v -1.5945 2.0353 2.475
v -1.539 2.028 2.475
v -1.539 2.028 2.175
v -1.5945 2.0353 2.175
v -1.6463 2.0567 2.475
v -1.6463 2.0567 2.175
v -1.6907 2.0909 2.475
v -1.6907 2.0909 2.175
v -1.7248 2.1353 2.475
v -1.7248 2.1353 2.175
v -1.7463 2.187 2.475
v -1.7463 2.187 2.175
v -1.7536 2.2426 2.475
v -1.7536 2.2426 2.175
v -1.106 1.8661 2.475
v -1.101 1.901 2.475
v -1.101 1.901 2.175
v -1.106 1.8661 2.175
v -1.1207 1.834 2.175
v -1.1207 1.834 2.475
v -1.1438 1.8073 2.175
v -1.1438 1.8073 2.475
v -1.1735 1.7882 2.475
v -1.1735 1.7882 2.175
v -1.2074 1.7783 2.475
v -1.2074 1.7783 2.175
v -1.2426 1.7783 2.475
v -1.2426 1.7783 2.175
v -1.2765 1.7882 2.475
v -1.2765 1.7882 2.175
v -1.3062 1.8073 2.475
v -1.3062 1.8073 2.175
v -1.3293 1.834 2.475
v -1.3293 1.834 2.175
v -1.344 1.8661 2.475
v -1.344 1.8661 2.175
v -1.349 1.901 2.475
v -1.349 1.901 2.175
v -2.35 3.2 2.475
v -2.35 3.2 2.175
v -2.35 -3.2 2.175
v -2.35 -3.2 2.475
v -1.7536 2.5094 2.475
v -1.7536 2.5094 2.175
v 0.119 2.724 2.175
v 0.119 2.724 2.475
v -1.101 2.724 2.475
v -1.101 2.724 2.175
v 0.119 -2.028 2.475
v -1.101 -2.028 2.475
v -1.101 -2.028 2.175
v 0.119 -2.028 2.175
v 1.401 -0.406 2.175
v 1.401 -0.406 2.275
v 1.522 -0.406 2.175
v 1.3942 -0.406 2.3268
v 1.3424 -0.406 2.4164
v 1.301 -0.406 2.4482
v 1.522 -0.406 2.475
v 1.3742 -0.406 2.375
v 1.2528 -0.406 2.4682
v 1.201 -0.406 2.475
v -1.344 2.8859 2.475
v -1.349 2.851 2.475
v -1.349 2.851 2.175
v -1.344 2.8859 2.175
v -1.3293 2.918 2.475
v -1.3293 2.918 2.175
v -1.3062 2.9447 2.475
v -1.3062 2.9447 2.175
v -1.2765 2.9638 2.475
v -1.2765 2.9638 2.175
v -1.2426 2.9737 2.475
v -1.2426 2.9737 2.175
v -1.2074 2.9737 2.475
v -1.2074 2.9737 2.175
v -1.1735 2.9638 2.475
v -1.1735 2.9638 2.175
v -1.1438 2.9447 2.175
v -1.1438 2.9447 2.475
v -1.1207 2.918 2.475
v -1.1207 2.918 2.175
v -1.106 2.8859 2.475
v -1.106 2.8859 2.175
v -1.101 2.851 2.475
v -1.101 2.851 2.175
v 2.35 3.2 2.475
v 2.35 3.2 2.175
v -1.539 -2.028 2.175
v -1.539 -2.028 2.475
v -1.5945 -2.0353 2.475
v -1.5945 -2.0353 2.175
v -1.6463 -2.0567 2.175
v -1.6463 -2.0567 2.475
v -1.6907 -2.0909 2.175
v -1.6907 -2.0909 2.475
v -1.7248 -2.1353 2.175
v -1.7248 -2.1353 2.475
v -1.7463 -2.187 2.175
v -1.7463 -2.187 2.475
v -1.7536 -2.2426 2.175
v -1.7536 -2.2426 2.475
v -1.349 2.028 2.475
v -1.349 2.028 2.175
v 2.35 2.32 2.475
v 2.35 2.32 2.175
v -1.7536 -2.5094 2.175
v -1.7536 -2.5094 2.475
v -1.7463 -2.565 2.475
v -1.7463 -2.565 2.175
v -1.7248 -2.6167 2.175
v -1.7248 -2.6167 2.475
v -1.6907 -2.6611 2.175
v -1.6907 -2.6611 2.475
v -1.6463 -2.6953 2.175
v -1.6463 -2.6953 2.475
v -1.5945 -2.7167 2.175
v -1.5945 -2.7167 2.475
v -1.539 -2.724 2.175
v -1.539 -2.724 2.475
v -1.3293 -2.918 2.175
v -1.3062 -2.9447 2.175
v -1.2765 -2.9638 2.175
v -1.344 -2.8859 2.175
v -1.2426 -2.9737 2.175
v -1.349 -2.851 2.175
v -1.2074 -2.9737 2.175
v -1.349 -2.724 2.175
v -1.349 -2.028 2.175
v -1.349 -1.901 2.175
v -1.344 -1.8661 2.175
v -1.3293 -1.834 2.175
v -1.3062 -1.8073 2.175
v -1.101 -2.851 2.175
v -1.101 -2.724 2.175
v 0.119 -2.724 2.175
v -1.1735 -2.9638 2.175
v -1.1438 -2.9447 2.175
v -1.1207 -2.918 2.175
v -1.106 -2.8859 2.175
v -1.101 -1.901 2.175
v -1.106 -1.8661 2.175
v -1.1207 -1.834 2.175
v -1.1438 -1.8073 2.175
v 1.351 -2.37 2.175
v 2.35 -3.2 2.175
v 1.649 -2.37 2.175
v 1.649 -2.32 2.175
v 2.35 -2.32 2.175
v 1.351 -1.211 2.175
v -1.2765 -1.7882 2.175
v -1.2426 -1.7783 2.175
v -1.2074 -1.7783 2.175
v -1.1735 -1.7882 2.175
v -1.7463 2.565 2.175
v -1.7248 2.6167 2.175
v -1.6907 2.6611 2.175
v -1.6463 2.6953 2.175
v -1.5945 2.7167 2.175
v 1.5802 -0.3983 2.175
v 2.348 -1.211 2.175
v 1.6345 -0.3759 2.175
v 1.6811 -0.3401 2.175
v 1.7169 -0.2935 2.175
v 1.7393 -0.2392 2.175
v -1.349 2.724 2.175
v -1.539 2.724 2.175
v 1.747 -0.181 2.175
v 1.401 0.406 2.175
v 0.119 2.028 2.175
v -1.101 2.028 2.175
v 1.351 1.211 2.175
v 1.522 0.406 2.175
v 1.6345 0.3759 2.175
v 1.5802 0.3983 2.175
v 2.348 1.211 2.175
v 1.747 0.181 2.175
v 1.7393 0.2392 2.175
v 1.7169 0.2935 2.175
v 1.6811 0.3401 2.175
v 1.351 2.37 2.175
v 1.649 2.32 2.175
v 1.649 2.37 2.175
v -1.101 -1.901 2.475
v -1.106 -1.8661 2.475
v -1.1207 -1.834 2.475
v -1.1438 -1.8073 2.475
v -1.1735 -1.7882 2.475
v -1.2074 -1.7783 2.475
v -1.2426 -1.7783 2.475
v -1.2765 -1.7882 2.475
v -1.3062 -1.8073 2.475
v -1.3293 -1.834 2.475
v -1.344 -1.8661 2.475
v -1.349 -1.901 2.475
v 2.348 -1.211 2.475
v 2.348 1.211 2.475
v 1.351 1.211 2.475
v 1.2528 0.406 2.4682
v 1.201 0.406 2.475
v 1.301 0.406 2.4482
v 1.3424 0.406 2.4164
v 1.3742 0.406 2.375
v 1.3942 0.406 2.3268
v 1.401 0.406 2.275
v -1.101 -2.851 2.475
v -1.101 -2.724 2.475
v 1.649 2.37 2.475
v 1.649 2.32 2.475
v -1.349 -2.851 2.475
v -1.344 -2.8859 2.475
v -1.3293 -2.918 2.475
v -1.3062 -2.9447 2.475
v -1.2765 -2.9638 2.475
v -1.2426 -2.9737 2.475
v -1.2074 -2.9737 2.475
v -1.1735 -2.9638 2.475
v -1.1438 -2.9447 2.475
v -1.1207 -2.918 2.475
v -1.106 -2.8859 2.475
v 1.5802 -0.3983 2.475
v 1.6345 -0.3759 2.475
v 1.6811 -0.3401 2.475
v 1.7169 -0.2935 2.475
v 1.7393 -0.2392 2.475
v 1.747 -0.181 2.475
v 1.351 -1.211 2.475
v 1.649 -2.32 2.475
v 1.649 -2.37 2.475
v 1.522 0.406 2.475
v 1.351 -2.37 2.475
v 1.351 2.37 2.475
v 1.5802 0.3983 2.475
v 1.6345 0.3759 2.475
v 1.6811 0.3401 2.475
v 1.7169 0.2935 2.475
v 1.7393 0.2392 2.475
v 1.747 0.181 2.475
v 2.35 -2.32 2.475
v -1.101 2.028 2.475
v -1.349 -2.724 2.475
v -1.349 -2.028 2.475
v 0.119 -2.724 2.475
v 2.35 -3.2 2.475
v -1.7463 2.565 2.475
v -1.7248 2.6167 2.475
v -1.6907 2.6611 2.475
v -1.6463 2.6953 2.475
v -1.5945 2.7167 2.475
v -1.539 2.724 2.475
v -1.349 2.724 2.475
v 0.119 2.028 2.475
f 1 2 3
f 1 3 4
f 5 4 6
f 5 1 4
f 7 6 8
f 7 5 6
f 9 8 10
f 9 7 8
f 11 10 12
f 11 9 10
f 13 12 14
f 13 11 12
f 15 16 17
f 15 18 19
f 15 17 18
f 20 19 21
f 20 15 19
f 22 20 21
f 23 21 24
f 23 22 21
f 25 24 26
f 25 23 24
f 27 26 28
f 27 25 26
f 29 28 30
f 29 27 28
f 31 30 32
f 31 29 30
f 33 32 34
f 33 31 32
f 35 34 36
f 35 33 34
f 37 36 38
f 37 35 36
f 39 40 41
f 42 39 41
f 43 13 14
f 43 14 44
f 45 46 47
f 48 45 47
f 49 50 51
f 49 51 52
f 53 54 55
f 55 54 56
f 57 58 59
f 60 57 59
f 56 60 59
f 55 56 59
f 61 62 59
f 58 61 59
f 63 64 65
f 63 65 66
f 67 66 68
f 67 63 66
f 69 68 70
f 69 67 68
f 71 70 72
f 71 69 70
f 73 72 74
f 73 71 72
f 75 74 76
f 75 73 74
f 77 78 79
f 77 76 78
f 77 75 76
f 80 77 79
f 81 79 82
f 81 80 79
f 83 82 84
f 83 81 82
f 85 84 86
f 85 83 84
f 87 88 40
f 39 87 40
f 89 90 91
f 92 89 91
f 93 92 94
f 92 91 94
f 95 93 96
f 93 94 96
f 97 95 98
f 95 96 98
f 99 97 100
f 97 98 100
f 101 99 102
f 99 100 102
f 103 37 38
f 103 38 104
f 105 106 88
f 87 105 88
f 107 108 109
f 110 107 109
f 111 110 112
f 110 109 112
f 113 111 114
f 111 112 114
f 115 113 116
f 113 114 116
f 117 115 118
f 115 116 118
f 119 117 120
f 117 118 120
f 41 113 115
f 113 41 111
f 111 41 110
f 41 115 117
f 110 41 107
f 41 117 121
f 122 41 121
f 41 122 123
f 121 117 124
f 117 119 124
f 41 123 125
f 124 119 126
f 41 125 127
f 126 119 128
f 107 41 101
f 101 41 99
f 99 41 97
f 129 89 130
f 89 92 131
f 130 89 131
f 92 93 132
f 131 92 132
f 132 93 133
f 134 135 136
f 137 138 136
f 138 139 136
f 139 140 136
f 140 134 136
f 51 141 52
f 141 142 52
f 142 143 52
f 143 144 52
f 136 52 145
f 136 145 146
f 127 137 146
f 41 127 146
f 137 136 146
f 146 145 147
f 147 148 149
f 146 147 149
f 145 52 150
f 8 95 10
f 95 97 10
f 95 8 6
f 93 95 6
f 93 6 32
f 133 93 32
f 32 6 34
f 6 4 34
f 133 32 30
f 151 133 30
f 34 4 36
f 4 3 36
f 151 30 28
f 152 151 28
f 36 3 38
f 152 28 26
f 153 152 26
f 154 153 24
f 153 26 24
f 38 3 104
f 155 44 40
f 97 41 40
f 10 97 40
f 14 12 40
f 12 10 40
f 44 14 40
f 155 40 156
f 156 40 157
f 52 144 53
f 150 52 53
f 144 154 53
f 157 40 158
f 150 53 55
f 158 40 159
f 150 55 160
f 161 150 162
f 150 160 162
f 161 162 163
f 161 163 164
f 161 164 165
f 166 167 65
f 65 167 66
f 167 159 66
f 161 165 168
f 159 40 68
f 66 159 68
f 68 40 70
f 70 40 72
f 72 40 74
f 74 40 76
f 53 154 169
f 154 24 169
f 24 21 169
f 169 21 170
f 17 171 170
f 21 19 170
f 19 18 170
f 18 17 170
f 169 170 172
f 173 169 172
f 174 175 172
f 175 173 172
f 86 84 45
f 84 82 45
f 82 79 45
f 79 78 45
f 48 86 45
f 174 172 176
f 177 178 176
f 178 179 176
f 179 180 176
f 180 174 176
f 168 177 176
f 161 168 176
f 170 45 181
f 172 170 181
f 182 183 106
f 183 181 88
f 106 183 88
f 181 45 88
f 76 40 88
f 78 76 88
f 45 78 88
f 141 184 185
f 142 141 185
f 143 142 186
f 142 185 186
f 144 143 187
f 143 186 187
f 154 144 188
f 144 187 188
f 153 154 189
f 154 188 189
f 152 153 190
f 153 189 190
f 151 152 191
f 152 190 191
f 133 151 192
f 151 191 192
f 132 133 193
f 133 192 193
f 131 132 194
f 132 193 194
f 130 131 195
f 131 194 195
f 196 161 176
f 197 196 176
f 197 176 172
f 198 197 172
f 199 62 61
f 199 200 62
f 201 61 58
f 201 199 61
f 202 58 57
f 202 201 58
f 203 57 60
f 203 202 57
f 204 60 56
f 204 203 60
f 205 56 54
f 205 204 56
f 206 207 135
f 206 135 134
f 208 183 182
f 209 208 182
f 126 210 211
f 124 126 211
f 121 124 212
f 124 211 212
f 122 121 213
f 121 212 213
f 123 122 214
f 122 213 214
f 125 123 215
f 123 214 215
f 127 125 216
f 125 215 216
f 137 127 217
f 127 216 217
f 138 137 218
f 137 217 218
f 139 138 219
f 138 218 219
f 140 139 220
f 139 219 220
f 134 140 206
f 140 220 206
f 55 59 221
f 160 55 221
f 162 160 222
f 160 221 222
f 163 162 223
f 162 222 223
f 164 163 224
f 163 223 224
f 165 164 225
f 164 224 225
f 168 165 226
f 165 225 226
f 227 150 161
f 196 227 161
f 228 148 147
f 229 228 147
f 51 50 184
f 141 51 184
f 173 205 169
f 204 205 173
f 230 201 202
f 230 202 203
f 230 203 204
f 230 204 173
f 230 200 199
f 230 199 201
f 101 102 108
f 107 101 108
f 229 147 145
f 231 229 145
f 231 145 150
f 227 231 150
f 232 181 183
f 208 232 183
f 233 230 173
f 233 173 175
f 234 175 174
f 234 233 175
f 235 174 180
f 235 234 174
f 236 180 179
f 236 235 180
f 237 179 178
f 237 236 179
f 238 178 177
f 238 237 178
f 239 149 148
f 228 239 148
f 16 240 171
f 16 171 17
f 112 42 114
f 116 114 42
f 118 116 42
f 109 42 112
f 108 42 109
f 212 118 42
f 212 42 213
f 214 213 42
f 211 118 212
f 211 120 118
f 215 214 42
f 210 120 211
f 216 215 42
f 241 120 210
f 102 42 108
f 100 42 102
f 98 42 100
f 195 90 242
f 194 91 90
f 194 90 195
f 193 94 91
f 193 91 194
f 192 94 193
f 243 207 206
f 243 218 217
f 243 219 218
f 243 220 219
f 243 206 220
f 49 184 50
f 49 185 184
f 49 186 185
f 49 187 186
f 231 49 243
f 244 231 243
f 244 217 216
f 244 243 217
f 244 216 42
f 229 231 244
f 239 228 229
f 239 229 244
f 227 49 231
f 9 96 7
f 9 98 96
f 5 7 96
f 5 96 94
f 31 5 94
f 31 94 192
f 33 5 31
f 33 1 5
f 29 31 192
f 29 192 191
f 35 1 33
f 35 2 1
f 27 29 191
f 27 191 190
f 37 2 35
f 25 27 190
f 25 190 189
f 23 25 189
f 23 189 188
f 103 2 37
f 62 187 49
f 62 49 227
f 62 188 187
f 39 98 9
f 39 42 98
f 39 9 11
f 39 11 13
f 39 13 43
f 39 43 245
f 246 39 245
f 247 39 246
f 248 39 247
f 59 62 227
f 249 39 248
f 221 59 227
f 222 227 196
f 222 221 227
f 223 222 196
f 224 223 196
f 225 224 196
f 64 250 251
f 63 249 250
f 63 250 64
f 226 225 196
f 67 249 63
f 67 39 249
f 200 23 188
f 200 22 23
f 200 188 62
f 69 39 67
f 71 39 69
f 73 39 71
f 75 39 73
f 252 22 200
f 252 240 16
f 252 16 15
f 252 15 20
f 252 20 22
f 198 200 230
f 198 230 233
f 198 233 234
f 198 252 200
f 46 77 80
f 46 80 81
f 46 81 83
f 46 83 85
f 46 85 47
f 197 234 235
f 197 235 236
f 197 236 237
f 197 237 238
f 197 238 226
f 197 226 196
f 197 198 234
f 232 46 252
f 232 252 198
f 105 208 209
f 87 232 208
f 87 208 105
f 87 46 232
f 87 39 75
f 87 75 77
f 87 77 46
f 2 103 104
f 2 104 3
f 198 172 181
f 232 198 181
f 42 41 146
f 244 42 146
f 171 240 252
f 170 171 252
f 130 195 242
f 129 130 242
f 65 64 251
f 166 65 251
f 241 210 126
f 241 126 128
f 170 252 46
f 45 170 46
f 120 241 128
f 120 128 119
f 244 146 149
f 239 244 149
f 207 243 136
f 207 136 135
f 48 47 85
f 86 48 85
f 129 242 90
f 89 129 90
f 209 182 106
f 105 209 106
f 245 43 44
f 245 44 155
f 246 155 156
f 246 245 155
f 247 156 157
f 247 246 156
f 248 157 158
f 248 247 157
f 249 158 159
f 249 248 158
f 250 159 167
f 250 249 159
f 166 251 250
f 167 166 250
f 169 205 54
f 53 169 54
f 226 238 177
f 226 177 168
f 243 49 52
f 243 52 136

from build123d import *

# Parameters (mm, degrees)
PAD005_DEPTH    = 0.3
POCKET004_DEPTH = 16.1931364203
FILLET002_R     = 0.2


with BuildPart() as part:
    # Sketch010 → Pad005 (new body)
    with BuildSketch(Plane(origin=(2.72e-08, -2.8e-08, 2.1749994204), x_dir=(1, 0, 0), z_dir=(0, 0, 1))):
        Polygon((-2.35, 3.2), (-2.35, -3.2), (2.35, -3.2), (2.35, -2.32), (1.649, -2.32), (1.649, -2.37), (1.351, -2.37), (1.351, -1.211), (2.348, -1.211), (2.348, 1.211), (1.351, 1.211), (1.351, 2.37), (1.649, 2.37), (1.649, 2.32), (2.35, 2.32), (2.35, 3.2), align=None)
    extrude(amount=PAD005_DEPTH)

    # Sketch011 (on Face18 of Pad005) → Pocket004 (cut, through all)
    with BuildSketch(Plane(origin=(2.72e-08, -2.8e-08, 2.4749994204), x_dir=(1, 0, 0), z_dir=(0, 0, 1))):
        with BuildLine():
            Line((-1.101, -2.028), (0.119, -2.028))
            Line((0.119, -2.028), (0.119, -2.724))
            Line((0.119, -2.724), (-1.101, -2.724))
            Line((-1.101, -2.724), (-1.101, -2.851))
            ThreePointArc((-1.349, -2.851), (-1.225, -2.975), (-1.101, -2.851))
            Line((-1.349, -2.851), (-1.349, -2.724))
            Line((-1.349, -2.724), (-1.539, -2.724))
            ThreePointArc((-1.7535861303, -2.5094138697), (-1.6907353079, -2.6611491776), (-1.539, -2.724))
            Line((-1.7535861303, -2.2425861303), (-1.7535861303, -2.5094138697))
            ThreePointArc((-1.539, -2.028), (-1.6907353079, -2.0908508224), (-1.7535861303, -2.2425861303))
            Line((-1.349, -2.028), (-1.539, -2.028))
            Line((-1.349, -1.9009999997), (-1.349, -2.028))
            ThreePointArc((-1.101, -1.901), (-1.2249999999, -1.777), (-1.349, -1.9009999997))
            Line((-1.101, -2.028), (-1.101, -1.901))
        make_face()
        with BuildLine():
            Line((1.401, 0), (1.401, -0.406))
            Line((1.401, -0.406), (1.522, -0.406))
            ThreePointArc((1.522, -0.406), (1.6810990258, -0.3400990258), (1.747, -0.181))
            Line((1.747, 0), (1.747, -0.181))
            Line((1.401, 0), (1.747, 0))
        make_face()
    pocket004 = extrude(amount=-POCKET004_DEPTH, mode=Mode.SUBTRACT)

    # Mirrored: Pocket004 across Sketch011 H_Axis
    add(pocket004.mirror(Plane(origin=(2.72e-08, -2.8e-08, 2.4749994204), x_dir=(0, 0, 1), z_dir=(0, 1, 0))), mode=Mode.SUBTRACT)

    # Fillet002
    fillet002_edges = [part.edges().sort_by_distance(p)[0] for p in [
        (1.401, 0, 2.474999),
    ]]
    fillet(fillet002_edges, radius=FILLET002_R)


solid = part.part
